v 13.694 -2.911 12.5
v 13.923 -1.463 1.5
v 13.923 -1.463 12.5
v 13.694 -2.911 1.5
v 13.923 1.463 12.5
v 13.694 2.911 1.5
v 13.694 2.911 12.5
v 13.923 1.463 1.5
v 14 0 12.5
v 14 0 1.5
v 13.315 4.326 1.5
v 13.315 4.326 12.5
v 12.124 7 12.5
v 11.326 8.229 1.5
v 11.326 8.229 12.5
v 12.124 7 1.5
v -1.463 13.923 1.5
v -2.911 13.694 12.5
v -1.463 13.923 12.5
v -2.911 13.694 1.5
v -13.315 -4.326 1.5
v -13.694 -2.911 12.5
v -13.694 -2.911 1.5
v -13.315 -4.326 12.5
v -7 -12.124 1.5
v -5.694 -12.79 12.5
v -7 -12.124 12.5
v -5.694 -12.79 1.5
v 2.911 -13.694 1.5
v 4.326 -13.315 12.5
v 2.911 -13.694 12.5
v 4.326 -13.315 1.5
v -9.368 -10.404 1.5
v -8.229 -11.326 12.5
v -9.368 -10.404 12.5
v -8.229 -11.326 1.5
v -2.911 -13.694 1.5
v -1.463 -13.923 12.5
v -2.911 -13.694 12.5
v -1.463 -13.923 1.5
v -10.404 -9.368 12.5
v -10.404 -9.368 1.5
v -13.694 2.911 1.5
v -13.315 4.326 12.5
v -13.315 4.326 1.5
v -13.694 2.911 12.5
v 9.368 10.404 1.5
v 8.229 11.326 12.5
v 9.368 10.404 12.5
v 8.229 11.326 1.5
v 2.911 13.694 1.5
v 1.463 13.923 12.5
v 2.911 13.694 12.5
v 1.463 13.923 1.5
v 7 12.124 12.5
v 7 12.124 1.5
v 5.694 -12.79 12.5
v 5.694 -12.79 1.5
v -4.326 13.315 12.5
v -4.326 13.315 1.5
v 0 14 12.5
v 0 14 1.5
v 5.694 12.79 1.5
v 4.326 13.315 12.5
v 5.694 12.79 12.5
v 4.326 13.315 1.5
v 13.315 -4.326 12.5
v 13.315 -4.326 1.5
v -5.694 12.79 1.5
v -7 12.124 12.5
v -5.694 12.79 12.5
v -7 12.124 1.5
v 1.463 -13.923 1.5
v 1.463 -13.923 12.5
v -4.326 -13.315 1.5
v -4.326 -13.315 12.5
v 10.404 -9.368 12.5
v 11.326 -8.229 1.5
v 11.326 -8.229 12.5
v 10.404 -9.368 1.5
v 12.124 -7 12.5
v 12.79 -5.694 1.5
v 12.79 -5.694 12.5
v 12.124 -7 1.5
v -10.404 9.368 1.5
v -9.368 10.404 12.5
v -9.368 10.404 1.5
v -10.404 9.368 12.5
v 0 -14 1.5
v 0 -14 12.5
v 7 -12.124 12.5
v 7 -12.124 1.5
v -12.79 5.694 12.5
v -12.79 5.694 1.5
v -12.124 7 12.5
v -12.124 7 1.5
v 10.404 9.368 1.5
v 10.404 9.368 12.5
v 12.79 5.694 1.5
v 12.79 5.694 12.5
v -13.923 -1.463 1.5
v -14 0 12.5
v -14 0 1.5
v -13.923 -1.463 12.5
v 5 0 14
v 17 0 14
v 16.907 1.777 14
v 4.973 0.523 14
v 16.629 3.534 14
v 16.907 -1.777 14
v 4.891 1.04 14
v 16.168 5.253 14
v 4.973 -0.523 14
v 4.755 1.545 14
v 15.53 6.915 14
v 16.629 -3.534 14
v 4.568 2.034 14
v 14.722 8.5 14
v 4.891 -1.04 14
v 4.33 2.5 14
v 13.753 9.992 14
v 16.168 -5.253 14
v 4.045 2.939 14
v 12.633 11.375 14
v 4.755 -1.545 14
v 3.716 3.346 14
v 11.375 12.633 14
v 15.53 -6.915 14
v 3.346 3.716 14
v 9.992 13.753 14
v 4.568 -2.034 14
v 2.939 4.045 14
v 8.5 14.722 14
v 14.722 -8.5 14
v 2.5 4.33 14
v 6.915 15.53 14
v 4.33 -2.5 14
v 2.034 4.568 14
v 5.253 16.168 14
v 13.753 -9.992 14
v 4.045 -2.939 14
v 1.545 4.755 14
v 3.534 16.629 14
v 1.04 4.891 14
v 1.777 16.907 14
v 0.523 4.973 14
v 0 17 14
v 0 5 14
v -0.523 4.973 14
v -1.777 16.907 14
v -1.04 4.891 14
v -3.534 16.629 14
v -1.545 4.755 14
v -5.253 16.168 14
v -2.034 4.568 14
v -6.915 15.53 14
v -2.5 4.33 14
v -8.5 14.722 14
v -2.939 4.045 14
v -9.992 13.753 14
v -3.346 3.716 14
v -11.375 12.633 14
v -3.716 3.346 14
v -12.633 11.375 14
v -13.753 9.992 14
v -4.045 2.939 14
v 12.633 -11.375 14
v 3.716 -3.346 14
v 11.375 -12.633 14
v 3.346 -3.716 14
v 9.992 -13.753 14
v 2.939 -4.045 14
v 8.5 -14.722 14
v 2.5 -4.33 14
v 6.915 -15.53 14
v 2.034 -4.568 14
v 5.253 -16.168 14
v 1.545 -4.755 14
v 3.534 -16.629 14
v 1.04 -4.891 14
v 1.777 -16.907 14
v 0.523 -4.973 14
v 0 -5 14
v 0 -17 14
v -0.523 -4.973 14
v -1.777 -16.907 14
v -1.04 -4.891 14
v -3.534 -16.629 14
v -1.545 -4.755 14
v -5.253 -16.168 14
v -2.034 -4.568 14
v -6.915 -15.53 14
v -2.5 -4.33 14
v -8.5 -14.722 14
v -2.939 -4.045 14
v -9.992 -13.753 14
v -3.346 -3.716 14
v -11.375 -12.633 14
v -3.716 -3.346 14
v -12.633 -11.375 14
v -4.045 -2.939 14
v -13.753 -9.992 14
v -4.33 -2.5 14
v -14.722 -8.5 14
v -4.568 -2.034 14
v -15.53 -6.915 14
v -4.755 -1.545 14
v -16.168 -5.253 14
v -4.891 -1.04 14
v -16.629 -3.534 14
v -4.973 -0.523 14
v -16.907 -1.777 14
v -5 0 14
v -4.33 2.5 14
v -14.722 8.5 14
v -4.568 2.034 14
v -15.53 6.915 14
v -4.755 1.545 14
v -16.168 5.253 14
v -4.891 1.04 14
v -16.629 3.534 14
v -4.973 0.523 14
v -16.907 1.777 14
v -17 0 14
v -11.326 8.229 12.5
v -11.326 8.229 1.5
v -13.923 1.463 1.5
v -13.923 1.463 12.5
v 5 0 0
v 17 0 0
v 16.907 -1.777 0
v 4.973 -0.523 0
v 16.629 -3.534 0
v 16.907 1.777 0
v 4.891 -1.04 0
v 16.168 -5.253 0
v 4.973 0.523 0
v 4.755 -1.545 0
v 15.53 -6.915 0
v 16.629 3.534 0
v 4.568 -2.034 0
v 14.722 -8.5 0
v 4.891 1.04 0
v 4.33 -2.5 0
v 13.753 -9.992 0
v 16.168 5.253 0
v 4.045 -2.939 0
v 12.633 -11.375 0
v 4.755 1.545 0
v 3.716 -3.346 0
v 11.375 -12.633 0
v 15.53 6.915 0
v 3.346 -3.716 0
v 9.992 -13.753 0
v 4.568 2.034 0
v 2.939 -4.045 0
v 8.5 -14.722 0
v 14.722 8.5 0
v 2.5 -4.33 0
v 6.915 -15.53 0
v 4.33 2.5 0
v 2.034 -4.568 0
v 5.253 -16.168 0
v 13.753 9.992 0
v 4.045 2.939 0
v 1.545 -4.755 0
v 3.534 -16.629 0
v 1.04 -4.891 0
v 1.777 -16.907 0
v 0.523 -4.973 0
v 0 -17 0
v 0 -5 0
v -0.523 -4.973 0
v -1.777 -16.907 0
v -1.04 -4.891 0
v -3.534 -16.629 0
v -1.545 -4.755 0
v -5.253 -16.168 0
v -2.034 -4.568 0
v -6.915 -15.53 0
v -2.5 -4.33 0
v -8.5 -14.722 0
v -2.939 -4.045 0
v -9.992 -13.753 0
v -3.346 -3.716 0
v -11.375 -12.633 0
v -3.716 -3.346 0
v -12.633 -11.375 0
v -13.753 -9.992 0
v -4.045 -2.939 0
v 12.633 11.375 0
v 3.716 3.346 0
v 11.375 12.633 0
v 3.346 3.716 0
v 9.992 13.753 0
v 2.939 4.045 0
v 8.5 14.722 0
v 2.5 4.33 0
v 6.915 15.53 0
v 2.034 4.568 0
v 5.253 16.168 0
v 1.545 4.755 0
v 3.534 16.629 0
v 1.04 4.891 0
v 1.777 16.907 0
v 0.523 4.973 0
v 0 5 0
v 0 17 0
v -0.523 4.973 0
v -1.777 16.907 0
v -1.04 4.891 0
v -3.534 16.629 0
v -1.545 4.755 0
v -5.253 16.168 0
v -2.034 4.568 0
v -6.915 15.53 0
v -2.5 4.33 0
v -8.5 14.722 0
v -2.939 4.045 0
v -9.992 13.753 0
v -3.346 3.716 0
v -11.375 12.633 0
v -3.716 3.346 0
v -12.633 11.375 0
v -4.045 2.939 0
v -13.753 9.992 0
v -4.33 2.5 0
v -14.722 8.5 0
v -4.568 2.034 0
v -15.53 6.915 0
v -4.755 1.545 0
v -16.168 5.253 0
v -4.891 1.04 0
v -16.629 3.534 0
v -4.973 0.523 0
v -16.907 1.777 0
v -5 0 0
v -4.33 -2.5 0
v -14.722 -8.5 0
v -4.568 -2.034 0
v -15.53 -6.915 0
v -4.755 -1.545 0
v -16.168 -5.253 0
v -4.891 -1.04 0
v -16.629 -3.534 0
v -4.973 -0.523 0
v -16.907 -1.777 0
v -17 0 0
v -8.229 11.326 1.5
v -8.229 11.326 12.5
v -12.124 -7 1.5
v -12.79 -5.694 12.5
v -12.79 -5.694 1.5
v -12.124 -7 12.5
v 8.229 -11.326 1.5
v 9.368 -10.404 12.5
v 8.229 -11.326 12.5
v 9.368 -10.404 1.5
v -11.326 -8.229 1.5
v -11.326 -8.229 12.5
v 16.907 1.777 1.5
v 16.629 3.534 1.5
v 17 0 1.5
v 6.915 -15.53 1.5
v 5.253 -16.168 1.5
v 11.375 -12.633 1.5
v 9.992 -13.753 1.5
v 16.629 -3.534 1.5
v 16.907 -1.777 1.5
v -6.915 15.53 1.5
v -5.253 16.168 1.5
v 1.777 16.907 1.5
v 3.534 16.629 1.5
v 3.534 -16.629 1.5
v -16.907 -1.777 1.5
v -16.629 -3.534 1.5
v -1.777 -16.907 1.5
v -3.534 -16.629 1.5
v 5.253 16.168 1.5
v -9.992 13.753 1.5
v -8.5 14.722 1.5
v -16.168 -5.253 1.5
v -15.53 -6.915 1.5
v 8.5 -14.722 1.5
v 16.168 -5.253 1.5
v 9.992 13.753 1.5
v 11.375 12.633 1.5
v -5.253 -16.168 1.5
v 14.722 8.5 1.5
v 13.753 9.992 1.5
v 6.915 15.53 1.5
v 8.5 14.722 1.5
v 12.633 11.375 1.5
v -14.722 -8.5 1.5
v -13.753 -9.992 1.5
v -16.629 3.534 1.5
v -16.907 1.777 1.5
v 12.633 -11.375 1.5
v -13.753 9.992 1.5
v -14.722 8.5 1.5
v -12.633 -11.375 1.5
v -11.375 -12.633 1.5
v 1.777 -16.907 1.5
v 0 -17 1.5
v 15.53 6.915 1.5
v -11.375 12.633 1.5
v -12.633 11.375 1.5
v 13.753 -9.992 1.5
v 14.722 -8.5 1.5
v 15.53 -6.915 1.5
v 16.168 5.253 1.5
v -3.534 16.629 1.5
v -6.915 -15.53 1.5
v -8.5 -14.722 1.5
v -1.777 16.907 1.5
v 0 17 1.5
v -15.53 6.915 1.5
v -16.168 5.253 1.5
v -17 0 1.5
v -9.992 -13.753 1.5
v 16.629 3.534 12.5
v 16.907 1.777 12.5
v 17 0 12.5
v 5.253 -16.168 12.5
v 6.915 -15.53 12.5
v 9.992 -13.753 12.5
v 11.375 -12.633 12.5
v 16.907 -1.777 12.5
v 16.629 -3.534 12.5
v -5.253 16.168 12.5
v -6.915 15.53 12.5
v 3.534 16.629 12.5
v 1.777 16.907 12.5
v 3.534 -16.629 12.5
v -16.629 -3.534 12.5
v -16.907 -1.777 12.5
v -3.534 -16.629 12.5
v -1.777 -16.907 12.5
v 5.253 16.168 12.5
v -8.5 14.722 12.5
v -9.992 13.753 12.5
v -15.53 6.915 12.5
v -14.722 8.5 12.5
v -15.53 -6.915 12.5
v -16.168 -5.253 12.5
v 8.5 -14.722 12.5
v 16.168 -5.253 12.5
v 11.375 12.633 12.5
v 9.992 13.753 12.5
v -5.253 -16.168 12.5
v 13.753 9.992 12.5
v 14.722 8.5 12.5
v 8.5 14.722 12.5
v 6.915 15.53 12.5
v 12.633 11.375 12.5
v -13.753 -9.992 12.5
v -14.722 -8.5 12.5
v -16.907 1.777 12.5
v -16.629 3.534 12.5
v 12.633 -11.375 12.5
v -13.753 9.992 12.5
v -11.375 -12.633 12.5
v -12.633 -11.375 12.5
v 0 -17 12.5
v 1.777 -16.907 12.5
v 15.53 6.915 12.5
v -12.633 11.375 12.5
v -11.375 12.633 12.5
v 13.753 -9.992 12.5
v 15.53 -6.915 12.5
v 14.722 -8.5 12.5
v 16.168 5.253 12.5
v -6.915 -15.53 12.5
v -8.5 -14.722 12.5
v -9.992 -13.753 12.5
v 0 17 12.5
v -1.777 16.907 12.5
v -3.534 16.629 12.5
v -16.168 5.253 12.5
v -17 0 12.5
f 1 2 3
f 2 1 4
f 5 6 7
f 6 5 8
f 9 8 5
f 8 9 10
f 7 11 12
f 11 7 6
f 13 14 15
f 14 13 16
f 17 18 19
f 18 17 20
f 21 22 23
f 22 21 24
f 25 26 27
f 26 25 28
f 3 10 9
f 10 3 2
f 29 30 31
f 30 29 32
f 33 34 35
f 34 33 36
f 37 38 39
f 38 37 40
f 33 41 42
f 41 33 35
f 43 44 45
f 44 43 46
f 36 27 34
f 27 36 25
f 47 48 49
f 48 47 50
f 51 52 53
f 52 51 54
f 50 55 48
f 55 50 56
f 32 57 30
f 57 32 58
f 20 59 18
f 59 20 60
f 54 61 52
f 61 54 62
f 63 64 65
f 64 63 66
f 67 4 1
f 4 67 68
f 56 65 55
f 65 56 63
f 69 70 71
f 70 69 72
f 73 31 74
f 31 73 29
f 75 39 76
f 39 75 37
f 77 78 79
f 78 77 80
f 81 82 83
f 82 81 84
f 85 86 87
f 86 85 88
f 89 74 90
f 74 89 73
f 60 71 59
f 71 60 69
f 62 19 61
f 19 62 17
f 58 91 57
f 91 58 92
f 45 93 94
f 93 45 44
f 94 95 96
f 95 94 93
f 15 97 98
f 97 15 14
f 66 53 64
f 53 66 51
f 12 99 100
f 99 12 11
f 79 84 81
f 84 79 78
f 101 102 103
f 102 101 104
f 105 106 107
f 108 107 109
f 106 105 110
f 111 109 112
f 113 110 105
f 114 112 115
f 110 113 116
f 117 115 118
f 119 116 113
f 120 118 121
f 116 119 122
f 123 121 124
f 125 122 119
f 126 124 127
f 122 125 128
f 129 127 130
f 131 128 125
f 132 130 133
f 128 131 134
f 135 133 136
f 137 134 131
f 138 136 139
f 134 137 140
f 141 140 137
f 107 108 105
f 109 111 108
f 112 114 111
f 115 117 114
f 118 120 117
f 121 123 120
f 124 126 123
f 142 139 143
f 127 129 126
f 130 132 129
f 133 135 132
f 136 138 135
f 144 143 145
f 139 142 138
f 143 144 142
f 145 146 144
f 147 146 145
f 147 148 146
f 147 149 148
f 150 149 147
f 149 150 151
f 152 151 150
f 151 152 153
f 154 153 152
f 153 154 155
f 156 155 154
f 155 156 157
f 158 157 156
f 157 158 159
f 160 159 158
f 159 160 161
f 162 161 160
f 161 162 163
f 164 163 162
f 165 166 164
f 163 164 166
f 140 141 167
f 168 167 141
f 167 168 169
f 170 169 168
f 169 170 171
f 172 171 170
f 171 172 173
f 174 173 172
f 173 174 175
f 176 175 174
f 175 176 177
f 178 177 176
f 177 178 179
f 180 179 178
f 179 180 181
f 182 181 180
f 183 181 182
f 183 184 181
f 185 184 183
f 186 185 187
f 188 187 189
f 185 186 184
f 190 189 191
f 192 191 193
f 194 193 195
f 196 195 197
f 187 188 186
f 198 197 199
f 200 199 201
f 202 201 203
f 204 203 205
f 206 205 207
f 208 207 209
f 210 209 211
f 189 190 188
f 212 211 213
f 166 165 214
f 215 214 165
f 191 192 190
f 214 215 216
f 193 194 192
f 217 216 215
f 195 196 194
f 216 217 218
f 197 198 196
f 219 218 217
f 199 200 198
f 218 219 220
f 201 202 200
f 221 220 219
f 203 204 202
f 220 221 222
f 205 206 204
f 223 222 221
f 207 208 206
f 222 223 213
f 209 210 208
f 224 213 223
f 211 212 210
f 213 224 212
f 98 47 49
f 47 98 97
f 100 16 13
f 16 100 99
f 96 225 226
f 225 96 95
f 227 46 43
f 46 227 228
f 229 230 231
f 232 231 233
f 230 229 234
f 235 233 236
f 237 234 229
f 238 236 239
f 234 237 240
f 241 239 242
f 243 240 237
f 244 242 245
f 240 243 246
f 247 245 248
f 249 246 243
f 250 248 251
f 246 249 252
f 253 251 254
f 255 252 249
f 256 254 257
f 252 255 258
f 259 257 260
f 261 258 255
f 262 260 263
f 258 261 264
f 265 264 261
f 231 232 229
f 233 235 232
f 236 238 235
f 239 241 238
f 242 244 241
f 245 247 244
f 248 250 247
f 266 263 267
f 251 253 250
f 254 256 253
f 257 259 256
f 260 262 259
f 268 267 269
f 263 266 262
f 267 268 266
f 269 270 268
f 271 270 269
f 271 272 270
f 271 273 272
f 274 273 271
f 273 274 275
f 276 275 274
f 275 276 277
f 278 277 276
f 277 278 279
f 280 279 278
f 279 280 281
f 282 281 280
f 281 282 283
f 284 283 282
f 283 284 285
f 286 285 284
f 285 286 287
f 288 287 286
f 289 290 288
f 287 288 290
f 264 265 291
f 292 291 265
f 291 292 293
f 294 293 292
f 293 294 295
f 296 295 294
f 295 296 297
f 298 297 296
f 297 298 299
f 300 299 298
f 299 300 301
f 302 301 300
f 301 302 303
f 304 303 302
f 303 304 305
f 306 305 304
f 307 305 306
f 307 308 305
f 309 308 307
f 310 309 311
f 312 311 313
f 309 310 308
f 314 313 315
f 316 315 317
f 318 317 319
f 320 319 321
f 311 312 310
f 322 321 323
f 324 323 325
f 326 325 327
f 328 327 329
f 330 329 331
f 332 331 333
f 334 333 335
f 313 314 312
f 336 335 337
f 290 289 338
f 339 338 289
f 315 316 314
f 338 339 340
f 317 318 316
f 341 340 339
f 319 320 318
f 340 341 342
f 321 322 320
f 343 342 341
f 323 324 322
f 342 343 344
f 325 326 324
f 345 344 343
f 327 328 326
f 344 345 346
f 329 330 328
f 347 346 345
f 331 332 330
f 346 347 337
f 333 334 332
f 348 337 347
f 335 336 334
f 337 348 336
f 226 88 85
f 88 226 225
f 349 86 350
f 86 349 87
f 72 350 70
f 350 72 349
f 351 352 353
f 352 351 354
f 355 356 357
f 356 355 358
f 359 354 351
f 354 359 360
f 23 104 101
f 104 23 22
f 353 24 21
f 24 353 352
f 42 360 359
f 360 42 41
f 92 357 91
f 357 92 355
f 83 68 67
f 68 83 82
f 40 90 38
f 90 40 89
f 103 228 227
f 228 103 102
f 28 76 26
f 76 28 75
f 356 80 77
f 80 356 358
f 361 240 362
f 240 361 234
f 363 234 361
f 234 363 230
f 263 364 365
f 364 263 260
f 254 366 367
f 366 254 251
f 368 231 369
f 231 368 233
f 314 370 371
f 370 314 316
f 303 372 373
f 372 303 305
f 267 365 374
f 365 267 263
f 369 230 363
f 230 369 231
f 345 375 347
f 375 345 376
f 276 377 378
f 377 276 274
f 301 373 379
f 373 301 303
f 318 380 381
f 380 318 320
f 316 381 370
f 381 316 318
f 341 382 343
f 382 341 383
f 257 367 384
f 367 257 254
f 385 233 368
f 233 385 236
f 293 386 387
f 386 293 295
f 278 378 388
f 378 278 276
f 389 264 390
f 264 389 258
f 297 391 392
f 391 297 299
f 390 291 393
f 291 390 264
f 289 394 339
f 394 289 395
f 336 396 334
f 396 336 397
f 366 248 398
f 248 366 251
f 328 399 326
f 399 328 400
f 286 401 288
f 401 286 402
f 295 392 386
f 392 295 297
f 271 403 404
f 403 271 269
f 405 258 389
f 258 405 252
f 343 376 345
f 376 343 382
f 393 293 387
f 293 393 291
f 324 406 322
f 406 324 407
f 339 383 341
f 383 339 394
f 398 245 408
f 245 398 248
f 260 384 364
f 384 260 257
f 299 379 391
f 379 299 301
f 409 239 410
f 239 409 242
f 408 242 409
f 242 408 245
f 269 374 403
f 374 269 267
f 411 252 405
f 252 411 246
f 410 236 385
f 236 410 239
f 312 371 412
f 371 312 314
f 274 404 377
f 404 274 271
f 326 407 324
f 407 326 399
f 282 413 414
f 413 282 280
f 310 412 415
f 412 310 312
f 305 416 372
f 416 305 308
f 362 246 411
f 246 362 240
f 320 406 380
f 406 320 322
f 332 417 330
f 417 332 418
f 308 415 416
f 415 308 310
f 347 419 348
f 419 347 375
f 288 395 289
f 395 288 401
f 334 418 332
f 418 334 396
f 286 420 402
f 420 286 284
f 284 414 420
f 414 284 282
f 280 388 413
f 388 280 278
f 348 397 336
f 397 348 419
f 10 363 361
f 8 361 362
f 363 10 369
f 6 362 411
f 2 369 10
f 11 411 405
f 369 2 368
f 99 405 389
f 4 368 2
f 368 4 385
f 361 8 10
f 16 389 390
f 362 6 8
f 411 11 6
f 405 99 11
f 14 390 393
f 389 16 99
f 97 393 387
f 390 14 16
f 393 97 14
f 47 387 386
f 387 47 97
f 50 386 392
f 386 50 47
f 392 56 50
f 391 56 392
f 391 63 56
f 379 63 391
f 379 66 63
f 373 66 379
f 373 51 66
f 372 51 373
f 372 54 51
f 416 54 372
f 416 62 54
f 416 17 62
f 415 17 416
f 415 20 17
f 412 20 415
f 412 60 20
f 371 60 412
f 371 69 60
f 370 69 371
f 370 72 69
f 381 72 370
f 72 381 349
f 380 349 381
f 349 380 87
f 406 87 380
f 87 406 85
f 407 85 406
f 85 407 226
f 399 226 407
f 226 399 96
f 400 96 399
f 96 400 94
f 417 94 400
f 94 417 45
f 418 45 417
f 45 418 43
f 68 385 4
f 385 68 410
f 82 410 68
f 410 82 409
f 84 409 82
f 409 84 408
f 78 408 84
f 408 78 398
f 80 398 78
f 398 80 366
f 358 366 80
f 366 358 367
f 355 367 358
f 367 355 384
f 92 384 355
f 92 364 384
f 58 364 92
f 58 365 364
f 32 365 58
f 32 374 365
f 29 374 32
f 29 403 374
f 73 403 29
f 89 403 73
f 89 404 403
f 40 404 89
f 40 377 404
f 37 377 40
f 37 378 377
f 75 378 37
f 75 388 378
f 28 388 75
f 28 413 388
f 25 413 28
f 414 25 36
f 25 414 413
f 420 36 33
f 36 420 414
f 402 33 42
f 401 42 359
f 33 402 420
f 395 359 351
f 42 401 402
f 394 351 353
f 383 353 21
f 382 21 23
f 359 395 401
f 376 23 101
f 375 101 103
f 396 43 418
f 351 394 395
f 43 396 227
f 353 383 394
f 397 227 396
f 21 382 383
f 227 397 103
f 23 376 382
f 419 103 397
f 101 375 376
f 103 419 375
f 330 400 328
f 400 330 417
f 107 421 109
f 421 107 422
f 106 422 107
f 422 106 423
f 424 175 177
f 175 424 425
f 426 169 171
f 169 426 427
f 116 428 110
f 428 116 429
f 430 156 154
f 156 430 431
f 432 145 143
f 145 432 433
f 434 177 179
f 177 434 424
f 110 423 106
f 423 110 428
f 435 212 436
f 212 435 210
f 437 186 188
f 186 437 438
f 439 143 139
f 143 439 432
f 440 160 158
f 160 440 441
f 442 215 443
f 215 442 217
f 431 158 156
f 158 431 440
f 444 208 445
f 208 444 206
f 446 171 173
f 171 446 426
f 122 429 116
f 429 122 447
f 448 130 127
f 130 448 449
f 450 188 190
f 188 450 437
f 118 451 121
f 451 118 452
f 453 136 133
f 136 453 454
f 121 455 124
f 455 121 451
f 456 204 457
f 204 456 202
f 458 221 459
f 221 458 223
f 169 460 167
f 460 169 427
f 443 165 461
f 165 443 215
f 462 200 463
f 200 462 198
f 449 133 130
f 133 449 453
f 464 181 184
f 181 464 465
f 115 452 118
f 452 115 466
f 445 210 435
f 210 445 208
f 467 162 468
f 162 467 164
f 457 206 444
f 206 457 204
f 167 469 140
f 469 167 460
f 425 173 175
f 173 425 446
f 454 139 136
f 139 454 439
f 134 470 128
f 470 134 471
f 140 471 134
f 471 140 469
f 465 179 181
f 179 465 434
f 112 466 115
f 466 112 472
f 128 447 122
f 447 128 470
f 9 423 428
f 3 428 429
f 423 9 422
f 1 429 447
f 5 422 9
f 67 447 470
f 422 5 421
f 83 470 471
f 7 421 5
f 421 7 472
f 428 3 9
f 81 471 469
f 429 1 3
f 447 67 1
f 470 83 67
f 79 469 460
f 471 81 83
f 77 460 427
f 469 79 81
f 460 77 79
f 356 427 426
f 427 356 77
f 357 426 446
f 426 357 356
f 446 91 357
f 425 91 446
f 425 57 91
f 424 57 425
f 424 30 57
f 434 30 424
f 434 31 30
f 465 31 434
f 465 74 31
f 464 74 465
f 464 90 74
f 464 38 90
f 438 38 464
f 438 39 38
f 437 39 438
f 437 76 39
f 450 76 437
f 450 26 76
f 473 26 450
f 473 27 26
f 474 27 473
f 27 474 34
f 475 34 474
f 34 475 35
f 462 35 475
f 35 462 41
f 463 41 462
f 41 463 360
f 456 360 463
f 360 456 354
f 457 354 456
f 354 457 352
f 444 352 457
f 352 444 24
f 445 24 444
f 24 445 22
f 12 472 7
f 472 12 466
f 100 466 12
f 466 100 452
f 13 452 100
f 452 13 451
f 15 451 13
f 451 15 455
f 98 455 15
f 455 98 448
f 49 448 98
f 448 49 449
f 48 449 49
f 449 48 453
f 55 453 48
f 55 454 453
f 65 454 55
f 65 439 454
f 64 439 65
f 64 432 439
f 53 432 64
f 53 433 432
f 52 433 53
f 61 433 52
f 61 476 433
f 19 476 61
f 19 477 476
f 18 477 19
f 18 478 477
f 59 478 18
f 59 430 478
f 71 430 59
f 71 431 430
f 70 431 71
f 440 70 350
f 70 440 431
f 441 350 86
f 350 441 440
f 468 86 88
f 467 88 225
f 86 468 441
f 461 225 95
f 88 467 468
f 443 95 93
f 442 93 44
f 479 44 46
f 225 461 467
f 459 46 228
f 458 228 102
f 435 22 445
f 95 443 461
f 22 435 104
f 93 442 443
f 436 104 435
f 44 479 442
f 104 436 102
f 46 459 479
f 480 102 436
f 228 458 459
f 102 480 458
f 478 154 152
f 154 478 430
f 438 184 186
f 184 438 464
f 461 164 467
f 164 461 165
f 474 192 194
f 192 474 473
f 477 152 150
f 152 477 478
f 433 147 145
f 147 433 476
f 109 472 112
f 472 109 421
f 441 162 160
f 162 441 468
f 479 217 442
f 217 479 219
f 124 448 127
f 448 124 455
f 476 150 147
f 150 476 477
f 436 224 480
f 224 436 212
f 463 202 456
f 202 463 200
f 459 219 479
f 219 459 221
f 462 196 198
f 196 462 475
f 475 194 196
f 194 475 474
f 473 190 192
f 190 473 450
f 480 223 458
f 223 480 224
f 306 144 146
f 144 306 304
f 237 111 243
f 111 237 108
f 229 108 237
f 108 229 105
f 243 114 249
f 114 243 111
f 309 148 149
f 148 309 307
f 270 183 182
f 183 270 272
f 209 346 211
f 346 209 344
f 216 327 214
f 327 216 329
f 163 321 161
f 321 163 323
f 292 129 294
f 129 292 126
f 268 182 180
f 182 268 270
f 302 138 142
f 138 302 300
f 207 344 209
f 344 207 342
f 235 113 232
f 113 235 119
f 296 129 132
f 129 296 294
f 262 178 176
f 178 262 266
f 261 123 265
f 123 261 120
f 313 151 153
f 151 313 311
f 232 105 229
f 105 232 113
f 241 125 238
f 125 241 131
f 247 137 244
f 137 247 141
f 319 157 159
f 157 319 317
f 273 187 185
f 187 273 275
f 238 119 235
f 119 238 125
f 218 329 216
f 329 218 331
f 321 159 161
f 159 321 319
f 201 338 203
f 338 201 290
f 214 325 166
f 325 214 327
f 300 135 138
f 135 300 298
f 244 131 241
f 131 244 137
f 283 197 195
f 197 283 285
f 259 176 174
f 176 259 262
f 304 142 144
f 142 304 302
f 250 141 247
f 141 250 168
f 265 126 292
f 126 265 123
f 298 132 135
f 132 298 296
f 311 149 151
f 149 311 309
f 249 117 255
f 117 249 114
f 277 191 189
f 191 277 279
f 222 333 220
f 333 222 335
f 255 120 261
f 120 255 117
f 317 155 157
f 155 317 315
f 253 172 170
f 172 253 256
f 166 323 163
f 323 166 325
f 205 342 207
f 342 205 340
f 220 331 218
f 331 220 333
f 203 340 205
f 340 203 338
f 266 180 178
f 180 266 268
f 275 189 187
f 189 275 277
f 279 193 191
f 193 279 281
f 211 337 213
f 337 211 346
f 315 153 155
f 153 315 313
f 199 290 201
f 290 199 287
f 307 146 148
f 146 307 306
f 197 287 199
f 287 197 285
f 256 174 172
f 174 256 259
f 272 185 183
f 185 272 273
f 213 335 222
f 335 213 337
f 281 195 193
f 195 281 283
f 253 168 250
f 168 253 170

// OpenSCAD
// Belt-guide pulley flange.
$fn = 60;
eps = 0.02;
bore_d = 10;
body_d = 28;
width = 14;
difference() { union() { cylinder(d=body_d,h=width); cylinder(d=body_d+6,h=1.5); translate([0,0,width-1.5]) cylinder(d=body_d+6,h=1.5); } translate([0,0,-eps]) cylinder(d=bore_d,h=width+2*eps); }
